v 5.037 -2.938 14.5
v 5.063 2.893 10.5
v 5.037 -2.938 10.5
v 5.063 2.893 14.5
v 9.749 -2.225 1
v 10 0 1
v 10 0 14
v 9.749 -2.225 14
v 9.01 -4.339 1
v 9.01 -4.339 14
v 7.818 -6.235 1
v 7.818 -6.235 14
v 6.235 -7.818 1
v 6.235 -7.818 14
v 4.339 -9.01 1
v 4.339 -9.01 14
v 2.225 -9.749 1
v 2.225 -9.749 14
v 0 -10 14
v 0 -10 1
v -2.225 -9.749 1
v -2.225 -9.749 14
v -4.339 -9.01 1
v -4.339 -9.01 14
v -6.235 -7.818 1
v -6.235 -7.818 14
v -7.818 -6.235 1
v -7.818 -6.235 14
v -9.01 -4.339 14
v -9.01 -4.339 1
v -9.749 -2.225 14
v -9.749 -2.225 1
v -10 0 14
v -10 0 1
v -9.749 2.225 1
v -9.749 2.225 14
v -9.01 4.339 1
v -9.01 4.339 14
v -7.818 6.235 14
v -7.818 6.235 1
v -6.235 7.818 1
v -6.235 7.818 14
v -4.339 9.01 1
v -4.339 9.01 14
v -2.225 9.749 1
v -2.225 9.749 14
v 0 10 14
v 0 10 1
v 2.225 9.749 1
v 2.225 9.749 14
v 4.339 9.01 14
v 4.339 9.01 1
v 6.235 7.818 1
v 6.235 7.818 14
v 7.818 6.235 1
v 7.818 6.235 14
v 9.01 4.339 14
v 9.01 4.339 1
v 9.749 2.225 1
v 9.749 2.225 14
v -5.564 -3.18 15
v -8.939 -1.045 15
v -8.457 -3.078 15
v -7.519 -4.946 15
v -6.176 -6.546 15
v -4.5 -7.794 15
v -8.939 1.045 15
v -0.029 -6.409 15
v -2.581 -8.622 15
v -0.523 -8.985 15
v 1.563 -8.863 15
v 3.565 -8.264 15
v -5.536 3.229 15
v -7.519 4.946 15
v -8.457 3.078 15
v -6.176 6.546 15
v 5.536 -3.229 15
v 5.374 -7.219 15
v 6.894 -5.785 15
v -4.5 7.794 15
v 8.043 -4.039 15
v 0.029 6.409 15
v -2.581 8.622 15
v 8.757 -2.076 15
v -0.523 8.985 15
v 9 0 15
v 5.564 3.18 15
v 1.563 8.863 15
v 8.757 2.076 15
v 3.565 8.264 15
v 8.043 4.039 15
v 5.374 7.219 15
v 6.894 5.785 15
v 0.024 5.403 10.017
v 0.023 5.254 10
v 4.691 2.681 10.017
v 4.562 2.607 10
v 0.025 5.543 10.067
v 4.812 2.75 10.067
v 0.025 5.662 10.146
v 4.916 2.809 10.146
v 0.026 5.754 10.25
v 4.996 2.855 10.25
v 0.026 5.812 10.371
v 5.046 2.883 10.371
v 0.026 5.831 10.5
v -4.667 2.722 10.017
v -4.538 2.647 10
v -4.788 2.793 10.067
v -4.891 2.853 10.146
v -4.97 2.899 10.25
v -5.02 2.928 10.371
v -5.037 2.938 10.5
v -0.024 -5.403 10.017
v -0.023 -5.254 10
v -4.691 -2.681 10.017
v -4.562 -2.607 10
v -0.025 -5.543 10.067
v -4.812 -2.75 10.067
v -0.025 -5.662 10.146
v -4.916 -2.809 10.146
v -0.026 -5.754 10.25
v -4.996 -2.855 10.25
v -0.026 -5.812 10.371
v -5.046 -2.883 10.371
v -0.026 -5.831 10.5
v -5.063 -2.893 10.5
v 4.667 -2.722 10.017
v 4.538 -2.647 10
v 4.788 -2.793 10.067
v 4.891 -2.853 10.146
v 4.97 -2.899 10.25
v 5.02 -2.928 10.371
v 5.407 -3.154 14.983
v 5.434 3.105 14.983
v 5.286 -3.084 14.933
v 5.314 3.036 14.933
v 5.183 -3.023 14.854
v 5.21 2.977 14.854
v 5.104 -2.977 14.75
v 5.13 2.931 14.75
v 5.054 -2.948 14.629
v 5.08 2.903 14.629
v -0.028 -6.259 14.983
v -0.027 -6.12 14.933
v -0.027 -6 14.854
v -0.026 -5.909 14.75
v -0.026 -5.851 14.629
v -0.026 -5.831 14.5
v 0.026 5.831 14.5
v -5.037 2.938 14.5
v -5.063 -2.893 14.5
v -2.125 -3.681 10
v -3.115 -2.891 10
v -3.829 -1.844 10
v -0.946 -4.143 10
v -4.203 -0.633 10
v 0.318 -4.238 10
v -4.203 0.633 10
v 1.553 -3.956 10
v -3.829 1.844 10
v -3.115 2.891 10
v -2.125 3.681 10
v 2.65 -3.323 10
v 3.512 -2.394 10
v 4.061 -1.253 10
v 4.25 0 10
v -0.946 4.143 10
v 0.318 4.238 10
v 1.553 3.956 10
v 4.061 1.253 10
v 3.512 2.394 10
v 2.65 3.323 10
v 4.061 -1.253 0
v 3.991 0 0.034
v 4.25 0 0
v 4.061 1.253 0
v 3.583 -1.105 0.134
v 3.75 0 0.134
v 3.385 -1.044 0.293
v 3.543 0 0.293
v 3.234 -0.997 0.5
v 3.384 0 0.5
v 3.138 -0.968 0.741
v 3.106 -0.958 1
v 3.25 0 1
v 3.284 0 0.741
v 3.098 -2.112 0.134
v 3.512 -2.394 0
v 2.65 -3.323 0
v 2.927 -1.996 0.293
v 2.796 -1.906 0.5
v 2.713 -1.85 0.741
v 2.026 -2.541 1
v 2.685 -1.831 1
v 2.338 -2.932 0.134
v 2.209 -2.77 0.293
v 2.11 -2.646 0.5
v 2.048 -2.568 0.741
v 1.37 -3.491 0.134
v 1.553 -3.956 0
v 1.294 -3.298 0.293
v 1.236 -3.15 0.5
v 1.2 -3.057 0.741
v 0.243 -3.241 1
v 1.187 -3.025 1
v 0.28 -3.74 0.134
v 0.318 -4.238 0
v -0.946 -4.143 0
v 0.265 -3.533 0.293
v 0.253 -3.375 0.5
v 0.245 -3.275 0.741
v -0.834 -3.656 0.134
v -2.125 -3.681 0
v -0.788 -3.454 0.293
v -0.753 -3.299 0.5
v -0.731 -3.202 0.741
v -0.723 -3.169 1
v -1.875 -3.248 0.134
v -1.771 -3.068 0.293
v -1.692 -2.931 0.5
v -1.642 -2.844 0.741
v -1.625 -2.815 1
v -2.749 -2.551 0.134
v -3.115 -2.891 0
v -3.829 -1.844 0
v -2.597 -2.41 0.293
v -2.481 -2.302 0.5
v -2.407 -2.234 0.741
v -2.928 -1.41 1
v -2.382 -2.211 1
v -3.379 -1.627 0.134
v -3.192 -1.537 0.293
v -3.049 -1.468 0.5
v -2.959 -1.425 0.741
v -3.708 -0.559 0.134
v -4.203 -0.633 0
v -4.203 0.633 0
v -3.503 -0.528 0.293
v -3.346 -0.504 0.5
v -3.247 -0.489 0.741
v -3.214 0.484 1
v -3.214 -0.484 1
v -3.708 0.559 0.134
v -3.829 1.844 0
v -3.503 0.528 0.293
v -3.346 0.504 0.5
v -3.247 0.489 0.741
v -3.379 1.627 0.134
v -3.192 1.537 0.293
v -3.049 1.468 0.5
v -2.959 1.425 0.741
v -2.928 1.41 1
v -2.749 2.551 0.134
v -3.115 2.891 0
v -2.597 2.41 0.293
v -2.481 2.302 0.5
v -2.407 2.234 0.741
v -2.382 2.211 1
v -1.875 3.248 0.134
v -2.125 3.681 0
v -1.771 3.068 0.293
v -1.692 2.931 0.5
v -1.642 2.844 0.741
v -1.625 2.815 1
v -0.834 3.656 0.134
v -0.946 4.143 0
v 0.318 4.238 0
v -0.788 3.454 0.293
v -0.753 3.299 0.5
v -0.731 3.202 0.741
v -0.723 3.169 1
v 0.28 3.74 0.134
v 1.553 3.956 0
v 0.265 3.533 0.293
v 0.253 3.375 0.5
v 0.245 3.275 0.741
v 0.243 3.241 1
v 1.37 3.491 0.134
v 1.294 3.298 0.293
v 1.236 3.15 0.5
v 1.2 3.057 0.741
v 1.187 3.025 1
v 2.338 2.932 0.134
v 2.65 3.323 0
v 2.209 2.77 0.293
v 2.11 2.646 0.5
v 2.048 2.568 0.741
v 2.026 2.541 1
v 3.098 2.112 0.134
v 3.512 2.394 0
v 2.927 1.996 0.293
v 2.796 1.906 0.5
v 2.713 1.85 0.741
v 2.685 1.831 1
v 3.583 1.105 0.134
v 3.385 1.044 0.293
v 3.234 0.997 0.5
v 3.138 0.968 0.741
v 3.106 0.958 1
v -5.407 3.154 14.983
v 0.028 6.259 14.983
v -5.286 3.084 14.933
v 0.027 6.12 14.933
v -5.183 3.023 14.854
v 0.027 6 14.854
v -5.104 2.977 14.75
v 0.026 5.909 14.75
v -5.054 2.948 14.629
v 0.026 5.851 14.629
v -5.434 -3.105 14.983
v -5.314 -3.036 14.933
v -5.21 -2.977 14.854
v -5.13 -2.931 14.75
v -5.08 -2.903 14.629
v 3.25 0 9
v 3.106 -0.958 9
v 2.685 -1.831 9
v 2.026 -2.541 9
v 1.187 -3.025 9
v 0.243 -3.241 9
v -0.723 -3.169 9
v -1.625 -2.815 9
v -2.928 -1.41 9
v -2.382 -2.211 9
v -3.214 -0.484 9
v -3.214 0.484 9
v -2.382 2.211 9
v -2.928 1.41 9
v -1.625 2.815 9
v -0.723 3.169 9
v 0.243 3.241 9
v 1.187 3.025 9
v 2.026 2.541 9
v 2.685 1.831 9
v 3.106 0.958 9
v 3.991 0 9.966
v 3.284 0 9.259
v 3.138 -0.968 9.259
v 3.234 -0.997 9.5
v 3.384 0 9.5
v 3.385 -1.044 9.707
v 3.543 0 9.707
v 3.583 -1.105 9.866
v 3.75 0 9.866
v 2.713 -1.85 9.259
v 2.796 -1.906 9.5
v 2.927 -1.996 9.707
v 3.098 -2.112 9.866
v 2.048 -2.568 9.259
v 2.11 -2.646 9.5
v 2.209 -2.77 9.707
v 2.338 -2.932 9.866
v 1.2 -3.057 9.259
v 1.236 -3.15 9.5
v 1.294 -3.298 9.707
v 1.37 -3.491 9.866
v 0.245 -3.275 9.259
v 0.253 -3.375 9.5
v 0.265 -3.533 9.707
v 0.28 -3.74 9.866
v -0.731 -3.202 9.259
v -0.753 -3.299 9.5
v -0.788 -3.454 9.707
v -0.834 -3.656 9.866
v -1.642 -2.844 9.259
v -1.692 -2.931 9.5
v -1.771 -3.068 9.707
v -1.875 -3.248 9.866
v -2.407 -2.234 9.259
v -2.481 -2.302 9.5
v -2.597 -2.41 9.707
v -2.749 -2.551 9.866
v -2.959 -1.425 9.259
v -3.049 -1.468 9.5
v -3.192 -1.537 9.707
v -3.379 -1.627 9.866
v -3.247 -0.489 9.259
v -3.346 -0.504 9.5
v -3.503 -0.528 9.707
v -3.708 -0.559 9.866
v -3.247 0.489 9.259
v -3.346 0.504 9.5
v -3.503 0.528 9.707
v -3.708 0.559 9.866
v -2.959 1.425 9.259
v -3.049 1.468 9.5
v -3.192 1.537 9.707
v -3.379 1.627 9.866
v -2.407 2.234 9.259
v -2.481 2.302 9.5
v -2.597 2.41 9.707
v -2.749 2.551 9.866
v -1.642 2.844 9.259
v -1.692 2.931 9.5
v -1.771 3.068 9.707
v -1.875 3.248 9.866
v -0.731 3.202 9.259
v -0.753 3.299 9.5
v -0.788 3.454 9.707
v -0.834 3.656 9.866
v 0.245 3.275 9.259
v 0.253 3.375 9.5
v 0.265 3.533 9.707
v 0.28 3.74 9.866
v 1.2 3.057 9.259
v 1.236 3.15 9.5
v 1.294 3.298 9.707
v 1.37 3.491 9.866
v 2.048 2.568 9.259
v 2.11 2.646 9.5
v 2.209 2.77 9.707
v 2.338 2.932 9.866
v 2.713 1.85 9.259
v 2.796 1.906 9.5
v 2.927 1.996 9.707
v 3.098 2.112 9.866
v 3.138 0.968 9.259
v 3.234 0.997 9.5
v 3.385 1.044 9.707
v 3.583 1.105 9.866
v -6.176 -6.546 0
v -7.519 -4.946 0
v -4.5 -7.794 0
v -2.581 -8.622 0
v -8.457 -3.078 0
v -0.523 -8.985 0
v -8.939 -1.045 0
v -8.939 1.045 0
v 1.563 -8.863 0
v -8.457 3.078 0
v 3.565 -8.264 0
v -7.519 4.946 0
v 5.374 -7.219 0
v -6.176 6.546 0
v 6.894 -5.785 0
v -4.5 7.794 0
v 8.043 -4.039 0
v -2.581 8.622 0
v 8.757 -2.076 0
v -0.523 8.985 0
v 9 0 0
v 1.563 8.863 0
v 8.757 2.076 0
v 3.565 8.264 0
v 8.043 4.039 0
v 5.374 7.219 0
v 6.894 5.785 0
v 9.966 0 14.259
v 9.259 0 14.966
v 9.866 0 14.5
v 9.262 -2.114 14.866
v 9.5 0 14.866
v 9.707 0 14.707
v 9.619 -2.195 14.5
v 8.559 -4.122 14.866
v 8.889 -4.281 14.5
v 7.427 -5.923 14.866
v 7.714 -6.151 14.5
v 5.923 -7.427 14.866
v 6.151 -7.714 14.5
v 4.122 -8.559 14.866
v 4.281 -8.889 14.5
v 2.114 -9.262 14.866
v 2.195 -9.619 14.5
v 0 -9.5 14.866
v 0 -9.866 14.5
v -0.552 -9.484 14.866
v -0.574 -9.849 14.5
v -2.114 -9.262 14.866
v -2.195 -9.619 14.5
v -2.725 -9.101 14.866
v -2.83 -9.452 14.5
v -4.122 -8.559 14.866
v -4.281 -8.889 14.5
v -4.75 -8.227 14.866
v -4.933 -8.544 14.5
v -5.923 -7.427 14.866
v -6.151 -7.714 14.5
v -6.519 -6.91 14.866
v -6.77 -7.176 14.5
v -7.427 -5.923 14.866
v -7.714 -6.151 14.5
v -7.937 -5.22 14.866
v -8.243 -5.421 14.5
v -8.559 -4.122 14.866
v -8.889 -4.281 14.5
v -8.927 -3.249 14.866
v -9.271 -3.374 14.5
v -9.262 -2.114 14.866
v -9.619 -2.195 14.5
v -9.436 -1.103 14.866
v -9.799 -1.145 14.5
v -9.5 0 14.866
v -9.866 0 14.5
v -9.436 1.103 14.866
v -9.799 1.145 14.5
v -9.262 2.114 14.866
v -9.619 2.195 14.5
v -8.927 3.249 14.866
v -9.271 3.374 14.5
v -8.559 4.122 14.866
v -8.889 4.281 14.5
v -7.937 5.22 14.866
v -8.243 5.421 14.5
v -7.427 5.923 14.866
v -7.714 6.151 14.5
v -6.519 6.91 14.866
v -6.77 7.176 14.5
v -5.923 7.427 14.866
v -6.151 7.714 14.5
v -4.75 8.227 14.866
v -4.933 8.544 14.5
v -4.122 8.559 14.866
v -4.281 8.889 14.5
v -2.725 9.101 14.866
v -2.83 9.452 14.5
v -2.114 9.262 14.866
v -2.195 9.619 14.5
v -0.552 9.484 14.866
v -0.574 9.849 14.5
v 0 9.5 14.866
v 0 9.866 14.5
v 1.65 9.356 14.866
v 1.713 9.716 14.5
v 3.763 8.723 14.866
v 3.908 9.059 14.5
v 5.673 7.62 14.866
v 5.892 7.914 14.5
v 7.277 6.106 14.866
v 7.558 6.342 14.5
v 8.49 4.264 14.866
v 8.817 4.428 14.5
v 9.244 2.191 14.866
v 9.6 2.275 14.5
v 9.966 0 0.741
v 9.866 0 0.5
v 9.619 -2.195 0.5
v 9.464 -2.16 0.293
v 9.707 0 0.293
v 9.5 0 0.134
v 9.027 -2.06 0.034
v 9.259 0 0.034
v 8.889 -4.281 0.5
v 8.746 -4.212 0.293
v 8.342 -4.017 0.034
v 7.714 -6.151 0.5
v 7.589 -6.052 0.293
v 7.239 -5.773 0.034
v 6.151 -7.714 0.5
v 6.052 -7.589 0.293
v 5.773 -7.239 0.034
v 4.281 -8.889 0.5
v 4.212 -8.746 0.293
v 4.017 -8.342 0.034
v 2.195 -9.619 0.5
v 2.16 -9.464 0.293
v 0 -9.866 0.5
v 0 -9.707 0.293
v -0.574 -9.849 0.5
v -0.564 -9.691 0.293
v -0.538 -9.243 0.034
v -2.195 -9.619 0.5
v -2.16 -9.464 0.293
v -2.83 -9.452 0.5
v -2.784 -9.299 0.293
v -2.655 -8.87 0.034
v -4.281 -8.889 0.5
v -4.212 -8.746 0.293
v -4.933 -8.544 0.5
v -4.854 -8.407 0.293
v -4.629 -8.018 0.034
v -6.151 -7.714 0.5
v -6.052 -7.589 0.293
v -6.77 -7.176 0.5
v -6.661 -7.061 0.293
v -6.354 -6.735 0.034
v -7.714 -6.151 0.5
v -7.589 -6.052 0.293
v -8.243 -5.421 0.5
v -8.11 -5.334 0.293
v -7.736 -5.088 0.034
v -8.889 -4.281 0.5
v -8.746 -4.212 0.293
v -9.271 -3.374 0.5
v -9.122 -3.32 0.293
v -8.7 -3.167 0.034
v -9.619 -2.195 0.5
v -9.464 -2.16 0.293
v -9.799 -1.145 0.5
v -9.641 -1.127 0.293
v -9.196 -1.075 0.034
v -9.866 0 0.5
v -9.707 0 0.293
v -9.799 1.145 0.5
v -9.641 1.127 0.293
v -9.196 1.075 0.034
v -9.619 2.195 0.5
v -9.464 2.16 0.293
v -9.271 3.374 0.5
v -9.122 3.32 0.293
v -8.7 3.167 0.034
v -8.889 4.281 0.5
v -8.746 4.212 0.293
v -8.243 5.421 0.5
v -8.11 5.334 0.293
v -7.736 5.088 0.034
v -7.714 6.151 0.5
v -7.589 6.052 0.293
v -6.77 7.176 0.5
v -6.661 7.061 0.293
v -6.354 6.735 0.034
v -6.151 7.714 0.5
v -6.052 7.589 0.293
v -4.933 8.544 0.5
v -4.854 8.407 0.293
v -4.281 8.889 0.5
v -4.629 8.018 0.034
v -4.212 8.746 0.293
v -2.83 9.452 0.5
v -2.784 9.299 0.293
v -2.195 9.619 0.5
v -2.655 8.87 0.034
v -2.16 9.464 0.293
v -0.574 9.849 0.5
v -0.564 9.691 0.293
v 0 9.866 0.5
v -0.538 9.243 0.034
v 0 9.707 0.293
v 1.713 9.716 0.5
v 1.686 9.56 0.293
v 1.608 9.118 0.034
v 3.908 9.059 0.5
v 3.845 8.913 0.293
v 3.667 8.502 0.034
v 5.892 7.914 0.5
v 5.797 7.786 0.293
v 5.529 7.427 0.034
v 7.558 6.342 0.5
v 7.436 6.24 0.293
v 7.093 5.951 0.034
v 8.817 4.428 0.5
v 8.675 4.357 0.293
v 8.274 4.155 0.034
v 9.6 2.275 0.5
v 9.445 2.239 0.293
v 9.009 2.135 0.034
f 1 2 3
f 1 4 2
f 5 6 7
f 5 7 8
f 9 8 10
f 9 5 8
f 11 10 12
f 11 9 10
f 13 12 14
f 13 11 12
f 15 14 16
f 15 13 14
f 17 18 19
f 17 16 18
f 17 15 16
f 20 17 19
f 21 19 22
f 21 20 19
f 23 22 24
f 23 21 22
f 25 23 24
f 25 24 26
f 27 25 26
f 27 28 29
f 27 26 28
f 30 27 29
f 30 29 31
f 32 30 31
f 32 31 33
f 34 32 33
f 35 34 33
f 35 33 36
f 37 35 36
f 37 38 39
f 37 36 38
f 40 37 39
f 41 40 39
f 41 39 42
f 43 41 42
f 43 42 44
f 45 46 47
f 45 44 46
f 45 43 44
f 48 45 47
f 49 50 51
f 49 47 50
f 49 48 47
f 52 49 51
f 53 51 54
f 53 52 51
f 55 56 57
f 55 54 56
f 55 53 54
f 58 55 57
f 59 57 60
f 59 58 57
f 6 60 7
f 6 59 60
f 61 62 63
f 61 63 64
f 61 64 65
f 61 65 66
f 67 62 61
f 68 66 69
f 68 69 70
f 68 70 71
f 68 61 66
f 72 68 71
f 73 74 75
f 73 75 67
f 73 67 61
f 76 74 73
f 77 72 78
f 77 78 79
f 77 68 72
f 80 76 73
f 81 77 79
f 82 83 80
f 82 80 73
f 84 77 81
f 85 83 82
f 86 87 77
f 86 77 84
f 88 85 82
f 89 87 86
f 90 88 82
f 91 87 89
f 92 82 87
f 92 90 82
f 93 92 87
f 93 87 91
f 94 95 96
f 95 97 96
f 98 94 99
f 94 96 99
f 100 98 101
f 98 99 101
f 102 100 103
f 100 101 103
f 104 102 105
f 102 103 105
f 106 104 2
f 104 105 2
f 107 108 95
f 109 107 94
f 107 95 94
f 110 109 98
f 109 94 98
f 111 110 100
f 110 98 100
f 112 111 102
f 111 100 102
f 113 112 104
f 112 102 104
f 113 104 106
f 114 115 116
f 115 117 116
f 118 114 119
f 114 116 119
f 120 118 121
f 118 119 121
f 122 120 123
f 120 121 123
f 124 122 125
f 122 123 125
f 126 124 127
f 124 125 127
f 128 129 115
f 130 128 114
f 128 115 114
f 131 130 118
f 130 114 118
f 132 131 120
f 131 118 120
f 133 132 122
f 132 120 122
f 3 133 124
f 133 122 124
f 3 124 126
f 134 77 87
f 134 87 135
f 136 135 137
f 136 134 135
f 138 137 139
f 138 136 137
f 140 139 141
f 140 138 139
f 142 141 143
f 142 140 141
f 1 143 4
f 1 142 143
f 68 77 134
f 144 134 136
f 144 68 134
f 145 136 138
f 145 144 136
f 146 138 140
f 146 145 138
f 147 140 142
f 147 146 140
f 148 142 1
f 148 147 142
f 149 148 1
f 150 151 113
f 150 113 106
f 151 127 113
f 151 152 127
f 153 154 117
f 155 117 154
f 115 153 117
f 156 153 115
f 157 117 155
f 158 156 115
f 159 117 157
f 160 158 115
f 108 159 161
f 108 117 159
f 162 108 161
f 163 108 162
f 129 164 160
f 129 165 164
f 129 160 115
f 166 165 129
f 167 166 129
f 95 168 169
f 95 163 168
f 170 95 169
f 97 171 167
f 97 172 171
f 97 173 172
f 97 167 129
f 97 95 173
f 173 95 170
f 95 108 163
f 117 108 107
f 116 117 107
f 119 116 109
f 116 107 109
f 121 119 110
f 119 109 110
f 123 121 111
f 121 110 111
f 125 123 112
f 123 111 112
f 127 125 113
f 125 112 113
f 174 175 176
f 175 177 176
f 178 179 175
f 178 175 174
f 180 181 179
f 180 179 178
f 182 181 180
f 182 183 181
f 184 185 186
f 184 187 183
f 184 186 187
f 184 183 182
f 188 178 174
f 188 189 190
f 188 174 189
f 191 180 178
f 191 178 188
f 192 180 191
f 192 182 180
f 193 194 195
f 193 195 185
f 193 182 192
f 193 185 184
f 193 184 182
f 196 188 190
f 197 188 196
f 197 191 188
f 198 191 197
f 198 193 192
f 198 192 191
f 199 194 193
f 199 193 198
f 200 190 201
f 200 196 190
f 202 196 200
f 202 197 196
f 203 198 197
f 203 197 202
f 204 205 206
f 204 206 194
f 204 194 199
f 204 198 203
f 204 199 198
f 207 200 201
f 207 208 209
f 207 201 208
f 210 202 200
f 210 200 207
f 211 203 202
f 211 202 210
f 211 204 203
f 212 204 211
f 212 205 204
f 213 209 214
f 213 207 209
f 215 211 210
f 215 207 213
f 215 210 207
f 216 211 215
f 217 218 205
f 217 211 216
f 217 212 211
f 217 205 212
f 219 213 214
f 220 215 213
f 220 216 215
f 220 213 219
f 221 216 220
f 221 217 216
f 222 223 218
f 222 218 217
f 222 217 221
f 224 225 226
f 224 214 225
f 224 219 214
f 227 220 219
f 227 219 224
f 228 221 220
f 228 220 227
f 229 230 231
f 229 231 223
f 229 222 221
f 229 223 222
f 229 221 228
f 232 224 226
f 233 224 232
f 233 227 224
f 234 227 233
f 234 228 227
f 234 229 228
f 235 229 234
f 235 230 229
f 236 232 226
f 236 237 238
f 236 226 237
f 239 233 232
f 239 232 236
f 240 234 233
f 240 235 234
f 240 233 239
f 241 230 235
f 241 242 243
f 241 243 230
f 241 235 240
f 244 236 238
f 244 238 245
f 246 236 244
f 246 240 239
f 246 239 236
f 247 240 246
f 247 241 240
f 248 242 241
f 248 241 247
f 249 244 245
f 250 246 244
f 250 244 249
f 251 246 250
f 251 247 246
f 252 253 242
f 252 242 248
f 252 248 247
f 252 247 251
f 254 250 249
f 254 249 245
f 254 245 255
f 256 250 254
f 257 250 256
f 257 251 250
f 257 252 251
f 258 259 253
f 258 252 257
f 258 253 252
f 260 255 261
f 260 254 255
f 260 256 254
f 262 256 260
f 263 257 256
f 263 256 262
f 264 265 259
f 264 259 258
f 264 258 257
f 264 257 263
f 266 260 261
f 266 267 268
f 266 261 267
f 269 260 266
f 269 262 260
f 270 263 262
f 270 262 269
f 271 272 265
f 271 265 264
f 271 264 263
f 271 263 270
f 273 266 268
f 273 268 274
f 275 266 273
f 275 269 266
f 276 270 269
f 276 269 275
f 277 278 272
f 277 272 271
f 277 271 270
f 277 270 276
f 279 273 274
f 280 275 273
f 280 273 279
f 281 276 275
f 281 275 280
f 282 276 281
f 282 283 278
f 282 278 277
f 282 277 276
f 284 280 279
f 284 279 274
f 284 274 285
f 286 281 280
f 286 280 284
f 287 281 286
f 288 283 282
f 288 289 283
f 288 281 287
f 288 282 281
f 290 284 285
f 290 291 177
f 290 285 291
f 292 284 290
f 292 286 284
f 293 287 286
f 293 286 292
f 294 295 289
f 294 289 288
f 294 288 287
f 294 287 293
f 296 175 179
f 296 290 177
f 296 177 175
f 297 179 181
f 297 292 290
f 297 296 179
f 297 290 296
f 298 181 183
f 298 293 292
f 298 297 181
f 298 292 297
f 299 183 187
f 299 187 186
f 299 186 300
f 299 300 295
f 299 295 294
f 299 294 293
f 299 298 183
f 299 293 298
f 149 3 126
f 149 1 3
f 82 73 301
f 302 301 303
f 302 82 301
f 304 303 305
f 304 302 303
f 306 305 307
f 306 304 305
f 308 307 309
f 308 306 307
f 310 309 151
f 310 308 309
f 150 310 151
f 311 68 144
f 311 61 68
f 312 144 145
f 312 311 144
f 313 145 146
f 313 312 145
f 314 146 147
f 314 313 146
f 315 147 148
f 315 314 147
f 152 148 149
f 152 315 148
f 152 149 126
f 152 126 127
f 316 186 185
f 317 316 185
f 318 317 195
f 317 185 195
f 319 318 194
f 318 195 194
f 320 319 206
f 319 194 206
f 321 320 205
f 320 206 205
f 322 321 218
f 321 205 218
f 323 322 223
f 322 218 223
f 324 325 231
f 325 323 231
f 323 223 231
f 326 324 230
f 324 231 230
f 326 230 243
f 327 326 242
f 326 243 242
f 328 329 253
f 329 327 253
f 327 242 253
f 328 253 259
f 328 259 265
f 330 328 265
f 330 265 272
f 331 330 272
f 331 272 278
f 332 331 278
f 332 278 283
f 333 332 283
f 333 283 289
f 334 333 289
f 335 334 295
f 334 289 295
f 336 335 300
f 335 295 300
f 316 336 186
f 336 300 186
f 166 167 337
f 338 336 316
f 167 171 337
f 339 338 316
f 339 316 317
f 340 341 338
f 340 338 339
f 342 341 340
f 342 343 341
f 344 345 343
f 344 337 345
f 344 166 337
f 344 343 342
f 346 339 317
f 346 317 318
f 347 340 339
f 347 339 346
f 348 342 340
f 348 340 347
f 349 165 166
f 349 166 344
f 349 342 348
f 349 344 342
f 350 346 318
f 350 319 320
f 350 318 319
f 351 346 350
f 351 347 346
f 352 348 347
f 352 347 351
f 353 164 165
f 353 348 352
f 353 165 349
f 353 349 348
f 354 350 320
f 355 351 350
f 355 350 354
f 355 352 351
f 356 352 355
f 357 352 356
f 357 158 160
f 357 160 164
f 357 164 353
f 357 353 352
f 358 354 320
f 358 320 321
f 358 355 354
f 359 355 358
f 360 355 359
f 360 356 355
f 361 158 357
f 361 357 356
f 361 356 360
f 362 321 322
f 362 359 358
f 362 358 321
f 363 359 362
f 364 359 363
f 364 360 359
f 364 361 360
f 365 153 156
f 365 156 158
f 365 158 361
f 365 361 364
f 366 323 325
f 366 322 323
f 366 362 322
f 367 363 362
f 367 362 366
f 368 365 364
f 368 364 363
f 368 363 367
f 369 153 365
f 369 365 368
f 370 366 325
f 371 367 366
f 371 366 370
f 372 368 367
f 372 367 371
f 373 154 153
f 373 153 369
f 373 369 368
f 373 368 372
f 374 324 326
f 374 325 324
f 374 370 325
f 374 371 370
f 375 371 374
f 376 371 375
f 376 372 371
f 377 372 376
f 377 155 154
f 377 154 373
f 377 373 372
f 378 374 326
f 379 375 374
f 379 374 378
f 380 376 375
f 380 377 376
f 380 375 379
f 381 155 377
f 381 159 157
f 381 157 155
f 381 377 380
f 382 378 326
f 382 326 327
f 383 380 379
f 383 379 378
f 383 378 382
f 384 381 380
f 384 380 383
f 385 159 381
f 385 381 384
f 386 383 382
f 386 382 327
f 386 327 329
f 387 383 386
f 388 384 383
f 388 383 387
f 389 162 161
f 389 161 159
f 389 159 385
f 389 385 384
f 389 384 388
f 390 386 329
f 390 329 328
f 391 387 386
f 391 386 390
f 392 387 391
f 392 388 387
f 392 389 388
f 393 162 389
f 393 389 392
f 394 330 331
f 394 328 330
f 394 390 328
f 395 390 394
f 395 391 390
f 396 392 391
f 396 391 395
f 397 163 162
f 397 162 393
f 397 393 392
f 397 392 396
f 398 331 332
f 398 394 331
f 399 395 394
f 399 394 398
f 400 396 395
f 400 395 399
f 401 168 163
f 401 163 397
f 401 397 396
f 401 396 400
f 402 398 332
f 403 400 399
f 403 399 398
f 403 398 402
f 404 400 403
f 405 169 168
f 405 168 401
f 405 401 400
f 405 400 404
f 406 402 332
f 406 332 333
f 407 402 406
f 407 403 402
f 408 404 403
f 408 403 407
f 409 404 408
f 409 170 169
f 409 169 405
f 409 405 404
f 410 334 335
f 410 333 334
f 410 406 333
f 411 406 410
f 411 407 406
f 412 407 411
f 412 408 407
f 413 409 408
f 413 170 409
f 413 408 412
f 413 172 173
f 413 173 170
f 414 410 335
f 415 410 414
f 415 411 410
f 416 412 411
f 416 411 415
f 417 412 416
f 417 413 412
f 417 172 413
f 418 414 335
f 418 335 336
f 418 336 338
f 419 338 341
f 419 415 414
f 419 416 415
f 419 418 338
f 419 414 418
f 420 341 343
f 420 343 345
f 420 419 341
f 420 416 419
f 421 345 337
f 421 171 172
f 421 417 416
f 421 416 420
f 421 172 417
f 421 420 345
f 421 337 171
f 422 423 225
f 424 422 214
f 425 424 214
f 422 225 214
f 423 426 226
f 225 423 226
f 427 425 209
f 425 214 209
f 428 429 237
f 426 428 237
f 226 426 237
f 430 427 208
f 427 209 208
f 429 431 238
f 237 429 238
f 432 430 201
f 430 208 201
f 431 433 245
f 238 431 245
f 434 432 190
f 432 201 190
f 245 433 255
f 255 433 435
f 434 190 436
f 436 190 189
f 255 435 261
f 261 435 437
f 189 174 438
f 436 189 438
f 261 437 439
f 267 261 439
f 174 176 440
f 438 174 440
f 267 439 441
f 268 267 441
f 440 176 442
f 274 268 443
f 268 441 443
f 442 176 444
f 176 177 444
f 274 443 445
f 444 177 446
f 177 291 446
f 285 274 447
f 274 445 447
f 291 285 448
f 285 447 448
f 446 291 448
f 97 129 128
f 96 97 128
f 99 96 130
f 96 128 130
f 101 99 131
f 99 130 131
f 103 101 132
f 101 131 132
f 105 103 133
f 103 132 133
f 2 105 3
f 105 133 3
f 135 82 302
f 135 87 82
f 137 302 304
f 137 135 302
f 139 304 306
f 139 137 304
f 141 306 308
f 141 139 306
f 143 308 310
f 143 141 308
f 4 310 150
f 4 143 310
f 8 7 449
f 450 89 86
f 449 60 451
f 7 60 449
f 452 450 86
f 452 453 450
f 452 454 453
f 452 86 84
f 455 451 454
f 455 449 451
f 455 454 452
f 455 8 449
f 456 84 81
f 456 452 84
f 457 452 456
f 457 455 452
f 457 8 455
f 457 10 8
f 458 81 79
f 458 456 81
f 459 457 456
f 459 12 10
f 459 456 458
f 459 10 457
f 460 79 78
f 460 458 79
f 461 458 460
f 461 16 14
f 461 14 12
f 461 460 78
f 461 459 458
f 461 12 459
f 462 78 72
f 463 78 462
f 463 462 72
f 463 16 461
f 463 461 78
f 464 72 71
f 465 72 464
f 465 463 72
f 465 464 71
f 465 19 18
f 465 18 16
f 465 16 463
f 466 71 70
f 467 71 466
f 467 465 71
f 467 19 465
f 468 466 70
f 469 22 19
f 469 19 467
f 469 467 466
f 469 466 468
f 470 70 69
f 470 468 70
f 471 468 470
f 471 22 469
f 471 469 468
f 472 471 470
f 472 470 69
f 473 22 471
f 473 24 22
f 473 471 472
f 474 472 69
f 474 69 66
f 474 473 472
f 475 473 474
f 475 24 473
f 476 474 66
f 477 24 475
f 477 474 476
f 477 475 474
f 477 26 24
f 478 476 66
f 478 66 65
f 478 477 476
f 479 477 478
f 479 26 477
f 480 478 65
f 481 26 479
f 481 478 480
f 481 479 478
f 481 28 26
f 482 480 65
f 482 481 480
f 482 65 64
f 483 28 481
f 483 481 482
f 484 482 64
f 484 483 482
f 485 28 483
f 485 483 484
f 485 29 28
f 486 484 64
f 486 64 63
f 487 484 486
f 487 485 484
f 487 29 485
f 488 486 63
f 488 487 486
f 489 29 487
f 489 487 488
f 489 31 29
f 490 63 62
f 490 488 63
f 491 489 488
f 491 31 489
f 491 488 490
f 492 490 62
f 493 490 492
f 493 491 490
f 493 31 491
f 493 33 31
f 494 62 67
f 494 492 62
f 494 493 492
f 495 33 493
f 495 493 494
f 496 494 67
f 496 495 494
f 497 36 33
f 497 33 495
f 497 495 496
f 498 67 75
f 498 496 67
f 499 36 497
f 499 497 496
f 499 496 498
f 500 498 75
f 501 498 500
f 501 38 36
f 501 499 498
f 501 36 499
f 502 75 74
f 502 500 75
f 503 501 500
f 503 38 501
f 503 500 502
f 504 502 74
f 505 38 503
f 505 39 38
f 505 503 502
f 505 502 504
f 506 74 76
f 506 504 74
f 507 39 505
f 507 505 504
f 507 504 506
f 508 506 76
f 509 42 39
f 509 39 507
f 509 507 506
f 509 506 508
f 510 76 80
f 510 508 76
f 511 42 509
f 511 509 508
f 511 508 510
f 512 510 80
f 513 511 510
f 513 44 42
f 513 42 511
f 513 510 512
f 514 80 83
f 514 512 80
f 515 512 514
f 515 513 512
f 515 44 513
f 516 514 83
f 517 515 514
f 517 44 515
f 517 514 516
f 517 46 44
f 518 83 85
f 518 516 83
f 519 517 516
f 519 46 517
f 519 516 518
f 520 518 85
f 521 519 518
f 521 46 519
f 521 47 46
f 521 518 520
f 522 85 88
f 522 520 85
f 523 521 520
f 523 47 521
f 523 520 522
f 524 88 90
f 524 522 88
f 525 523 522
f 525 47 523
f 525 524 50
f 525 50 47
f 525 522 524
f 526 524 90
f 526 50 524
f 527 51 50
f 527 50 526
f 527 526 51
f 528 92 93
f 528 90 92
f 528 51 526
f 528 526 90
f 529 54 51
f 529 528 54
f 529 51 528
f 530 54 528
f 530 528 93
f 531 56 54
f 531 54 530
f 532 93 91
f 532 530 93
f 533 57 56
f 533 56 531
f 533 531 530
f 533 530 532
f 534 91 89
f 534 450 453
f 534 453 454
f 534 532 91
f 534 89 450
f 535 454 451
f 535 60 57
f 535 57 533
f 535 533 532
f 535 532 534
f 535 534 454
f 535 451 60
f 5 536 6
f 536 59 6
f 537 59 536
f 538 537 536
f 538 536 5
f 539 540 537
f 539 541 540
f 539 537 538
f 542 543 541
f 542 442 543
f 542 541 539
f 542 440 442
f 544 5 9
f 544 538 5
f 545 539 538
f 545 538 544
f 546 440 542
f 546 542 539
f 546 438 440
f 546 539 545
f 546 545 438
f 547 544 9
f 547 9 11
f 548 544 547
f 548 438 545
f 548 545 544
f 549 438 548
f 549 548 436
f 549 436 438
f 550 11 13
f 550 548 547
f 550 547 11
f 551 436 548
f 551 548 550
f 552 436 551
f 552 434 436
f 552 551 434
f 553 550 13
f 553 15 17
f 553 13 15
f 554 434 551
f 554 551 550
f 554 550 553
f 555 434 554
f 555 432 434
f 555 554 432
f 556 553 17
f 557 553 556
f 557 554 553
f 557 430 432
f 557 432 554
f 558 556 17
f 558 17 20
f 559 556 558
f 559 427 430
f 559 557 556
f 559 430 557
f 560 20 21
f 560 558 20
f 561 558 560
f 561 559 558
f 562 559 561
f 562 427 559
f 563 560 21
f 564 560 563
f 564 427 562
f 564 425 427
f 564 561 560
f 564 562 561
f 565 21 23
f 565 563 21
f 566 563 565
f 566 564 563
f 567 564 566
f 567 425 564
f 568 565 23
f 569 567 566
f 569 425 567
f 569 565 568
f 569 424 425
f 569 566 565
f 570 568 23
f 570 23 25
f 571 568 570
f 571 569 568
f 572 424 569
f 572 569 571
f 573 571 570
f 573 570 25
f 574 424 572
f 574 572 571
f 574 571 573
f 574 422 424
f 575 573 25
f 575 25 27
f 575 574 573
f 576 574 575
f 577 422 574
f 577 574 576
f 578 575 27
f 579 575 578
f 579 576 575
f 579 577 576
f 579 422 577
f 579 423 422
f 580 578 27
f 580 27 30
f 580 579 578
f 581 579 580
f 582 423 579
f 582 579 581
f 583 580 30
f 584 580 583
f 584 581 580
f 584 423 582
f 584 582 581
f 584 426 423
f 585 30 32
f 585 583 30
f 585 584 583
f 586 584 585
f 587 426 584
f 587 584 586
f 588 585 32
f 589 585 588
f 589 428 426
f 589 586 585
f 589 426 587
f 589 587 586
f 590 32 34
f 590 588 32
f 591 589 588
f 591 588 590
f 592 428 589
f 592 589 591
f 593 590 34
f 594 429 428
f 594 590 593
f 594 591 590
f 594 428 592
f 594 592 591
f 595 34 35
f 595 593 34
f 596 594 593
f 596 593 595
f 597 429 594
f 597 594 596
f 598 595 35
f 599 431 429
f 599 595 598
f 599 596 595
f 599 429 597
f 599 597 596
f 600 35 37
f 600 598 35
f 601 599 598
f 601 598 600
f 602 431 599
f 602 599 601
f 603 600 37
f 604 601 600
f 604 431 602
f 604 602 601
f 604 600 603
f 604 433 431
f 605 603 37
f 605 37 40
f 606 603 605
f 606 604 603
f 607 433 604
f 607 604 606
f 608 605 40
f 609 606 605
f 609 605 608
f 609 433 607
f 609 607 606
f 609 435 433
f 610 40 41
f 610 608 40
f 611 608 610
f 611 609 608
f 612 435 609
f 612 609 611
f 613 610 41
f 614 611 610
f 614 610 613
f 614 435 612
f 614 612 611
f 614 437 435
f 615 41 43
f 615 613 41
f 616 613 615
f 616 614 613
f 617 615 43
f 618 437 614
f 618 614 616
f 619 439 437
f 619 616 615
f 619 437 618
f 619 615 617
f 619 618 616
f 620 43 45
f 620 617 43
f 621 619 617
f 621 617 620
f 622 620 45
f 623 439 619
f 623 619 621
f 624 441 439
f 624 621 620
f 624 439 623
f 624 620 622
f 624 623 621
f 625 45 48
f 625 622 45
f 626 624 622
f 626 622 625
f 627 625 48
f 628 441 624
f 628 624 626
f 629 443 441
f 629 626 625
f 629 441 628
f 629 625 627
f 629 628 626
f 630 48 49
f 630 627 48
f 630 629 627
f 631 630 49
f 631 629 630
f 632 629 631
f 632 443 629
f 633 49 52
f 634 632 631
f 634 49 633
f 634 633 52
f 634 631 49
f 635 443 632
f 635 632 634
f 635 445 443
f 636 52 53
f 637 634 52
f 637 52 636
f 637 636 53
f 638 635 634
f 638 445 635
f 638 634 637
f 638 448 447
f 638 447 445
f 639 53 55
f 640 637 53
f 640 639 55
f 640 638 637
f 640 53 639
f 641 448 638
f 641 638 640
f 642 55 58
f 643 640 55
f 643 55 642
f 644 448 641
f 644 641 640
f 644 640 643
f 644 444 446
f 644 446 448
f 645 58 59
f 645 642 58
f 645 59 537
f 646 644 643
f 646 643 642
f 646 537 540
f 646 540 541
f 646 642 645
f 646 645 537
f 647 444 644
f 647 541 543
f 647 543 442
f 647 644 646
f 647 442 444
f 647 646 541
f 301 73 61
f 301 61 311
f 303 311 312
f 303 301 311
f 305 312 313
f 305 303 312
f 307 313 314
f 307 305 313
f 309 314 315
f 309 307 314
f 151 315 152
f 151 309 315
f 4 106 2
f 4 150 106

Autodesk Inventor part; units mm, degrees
ref_plane "YZ Plane" through (0, 0, 0) normal (1, 0, 0) x (0, 1, 0)
ref_plane "XZ Plane" through (0, 0, 0) normal (0, 1, 0) x (-1, 0, 0)
ref_plane "XY Plane" through (0, 0, 0) normal (0, 0, 1) x (1, 0, 0)
sketch "Sketch2" plane through (0, 0, 0) normal (0, 0, 1) x (1, 0, 0)
  circle A0 centre (0, 0) radius 10
  circle A1 centre (0, 0) radius 3.25
  dimension "d0" = 20
  dimension "d1" = 6.5
extrude "Extrusion1" add sketch "Sketch2" along normal blind 15
sketch "Sketch3" plane through (0, 0, 15) normal (0, 0, 1) x (1, 0, 0)
  circle A0 centre (0, 0) radius 3.25 projected
  line L0 (5.0629, 2.8931) -> (5.037, -2.9381)
  line L1 (5.037, -2.9381) -> (-0.026, -5.8312)
  line L2 (-0.026, -5.8312) -> (-5.0629, -2.8931)
  line L3 (-5.0629, -2.8931) -> (-5.037, 2.9381)
  line L4 (-5.037, 2.9381) -> (0.026, 5.8312)
  line L5 (0.026, 5.8312) -> (5.0629, 2.8931)
  dimension "d4" = 10.1
extrude "Extrusion2" cut sketch "Sketch3" against normal blind 5
fillet "Fillet1" radius 0.5 12 edges at (-2.5055, 4.3846, 15) (2.5444, 4.3621, 15) (5.0499, -0.0225, 15) (2.5055, -4.3846, 15) (-2.5444, -4.3621, 15) (-5.0499, 0.0225, 15) (-5.0499, 0.0225, 10) (-2.5055, 4.3846, 10) (2.5444, 4.3621, 10) (5.0499, -0.0225, 10) (2.5055, -4.3846, 10) (-2.5444, -4.3621, 10)
fillet "Fillet2" radius 1 4 edges at (-3.25, 0, 10) (-3.25, 0, 0) (-10, 0, 15) (-10, 0, 0)
properties part number "ExtensionFastener"
